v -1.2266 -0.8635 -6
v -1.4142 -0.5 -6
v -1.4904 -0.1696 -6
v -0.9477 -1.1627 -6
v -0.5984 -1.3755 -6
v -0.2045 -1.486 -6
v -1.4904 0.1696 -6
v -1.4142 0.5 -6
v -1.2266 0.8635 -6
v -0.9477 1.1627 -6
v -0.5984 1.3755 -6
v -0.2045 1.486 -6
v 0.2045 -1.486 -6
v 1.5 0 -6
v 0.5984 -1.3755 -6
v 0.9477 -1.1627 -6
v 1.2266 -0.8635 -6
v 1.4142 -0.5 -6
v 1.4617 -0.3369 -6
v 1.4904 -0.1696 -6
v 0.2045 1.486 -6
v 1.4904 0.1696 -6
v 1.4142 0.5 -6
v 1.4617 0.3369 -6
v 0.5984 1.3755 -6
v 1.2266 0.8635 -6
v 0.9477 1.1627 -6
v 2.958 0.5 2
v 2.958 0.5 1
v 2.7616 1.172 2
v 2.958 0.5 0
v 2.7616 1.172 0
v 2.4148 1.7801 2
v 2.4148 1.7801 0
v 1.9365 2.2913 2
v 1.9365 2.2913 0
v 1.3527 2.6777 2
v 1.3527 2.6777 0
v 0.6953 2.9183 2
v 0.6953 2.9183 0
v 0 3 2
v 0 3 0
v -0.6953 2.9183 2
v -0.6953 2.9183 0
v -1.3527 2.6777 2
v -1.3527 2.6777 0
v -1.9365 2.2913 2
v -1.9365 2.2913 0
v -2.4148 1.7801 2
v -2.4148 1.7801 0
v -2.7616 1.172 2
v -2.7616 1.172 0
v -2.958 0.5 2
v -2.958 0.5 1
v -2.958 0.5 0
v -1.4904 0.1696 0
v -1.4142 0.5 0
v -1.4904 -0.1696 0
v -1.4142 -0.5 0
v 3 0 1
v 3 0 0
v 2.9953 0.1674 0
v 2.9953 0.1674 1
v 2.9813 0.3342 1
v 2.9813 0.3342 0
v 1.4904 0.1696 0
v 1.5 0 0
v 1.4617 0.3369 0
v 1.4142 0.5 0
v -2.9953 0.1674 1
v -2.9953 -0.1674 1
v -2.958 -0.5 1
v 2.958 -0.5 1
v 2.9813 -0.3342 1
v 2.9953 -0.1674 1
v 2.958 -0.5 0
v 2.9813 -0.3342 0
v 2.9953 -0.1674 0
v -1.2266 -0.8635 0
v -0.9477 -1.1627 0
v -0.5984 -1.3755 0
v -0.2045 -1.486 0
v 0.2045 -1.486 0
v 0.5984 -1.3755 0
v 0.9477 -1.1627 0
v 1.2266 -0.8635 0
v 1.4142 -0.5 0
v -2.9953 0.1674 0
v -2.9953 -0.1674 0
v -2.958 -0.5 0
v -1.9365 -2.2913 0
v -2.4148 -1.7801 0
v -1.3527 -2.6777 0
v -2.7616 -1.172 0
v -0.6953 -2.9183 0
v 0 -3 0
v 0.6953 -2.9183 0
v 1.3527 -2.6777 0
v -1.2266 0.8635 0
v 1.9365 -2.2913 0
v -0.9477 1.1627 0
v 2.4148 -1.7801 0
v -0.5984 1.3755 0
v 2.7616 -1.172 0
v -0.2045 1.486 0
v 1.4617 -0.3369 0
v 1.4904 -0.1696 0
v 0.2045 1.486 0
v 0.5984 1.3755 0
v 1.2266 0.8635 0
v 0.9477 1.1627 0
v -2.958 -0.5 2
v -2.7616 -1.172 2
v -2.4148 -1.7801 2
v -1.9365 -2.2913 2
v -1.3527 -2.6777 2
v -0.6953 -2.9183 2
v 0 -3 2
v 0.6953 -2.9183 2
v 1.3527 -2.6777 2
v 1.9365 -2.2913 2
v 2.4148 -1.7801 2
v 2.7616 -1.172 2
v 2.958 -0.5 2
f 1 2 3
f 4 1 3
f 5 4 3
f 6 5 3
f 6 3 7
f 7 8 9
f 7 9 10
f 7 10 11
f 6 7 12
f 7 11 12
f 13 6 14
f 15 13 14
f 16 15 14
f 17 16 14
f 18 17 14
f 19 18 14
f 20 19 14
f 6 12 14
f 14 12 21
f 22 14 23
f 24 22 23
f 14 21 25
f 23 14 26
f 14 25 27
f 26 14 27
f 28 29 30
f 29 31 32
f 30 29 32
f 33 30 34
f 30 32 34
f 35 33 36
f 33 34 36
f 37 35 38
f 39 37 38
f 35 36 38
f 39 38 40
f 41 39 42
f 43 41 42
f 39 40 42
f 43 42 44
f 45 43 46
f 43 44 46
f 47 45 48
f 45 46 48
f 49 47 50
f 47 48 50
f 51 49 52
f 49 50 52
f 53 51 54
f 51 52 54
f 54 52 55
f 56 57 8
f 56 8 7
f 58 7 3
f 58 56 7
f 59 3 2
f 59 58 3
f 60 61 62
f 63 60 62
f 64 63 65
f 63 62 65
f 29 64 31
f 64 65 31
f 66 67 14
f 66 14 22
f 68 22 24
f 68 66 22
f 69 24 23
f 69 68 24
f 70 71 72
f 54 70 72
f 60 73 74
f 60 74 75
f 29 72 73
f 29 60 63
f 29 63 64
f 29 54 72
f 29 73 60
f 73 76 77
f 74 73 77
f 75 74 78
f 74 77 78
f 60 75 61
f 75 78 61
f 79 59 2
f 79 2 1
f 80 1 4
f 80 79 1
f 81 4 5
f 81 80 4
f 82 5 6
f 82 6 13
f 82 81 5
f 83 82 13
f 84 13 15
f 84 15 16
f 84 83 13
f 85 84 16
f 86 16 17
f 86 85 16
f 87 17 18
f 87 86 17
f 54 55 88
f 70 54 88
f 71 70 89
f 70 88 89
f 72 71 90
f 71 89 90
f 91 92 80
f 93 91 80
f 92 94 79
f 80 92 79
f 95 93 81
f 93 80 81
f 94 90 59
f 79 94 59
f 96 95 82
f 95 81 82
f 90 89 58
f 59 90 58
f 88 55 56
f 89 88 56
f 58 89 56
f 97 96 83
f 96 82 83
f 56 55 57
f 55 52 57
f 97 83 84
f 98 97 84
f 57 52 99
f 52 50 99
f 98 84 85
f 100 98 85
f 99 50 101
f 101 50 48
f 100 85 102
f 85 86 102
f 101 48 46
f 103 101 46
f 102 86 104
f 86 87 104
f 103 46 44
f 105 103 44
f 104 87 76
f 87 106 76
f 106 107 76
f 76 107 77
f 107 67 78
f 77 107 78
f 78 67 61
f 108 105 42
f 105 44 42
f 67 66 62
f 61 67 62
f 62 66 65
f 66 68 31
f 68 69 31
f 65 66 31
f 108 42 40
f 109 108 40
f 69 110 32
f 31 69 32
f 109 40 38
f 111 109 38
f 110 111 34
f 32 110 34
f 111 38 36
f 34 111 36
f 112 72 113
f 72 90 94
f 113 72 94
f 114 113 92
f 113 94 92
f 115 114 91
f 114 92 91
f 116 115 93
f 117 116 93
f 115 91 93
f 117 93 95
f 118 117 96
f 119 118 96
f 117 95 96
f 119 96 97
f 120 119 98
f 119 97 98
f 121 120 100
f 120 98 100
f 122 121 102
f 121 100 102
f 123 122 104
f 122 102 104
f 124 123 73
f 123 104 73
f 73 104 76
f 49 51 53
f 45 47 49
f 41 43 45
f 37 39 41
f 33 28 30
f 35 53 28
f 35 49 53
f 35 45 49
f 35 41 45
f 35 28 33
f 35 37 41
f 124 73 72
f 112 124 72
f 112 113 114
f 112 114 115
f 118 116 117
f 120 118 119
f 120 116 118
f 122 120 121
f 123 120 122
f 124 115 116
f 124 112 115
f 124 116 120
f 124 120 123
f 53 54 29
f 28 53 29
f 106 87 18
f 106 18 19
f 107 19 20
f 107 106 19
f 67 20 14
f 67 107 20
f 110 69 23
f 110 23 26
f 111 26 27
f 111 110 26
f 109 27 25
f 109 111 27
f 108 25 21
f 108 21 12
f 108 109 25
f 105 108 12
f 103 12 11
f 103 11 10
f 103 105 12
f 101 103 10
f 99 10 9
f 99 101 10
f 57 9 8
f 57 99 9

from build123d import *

# Parameters (mm, degrees)
F1_DEPTH = 6
F2_DEPTH = 2
F3_DEPTH = 1


# Not quite as in the source:
# - a feature names something its author has since deleted; it is built from what else it names


with BuildPart() as f1:
    # F0 (on Top) → F1 (new body)
    with BuildSketch(Plane.XY):
        with BuildLine():
            Line((-1.4142135624, 0.5), (1.4142135624, 0.5))
            ThreePointArc((1.4142135624, 0.5), (0, 1.5), (-1.4142135624, 0.5))
        make_face()
        with BuildLine():
            ThreePointArc((1.5, 0), (1.4783978395, 0.2536529681), (1.4142135624, 0.5))
            Line((1.4142135624, 0.5), (-1.4142135624, 0.5))
            ThreePointArc((-1.4142135624, 0.5), (-1.5, 0), (-1.4142135624, -0.5))
            Line((-1.4142135624, -0.5), (1.4142135624, -0.5))
            ThreePointArc((1.4142135624, -0.5), (1.4783978395, -0.2536529681), (1.5, 0))
        make_face()
        with BuildLine():
            ThreePointArc((-1.4142135624, -0.5), (0, -1.5), (1.4142135624, -0.5))
            Line((1.4142135624, -0.5), (-1.4142135624, -0.5))
        make_face()
    extrude(amount=-F1_DEPTH)

    # F0 (on Top) → F2 (join)
    with BuildSketch(Plane.XY):
        with BuildLine():
            ThreePointArc((-2.9580398915, -0.5), (0, -3), (2.9580398915, -0.5))
            Line((2.9580398915, -0.5), (1.4142135624, -0.5))
            ThreePointArc((1.4142135624, -0.5), (0, -1.5), (-1.4142135624, -0.5))
            Line((-1.4142135624, -0.5), (-2.9580398915, -0.5))
        make_face()
        with BuildLine():
            Line((1.4142135624, 0.5), (2.9580398915, 0.5))
            ThreePointArc((2.9580398915, 0.5), (0, 3), (-2.9580398915, 0.5))
            Line((-2.9580398915, 0.5), (-1.4142135624, 0.5))
            ThreePointArc((-1.4142135624, 0.5), (0, 1.5), (1.4142135624, 0.5))
        make_face()
        with BuildLine():
            Line((-1.4142135624, 0.5), (1.4142135624, 0.5))
            ThreePointArc((1.4142135624, 0.5), (0, 1.5), (-1.4142135624, 0.5))
        make_face()
        with BuildLine():
            ThreePointArc((-1.4142135624, -0.5), (0, -1.5), (1.4142135624, -0.5))
            Line((1.4142135624, -0.5), (-1.4142135624, -0.5))
        make_face()
    extrude(amount=F2_DEPTH)

    # F0 (on Top) → F3 (join)
    with BuildSketch(Plane.XY):
        with BuildLine():
            Line((-1.4142135624, 0.5), (-2.9580398915, 0.5))
            ThreePointArc((-2.9580398915, 0.5), (-3, 0), (-2.9580398915, -0.5))
            Line((-2.9580398915, -0.5), (-1.4142135624, -0.5))
            ThreePointArc((-1.4142135624, -0.5), (-1.5, 0), (-1.4142135624, 0.5))
        make_face()
        with BuildLine():
            ThreePointArc((1.5, 0), (1.4783978395, 0.2536529681), (1.4142135624, 0.5))
            Line((1.4142135624, 0.5), (-1.4142135624, 0.5))
            ThreePointArc((-1.4142135624, 0.5), (-1.5, 0), (-1.4142135624, -0.5))
            Line((-1.4142135624, -0.5), (1.4142135624, -0.5))
            ThreePointArc((1.4142135624, -0.5), (1.4783978395, -0.2536529681), (1.5, 0))
        make_face()
        with BuildLine():
            ThreePointArc((2.9580398915, -0.5), (2.9894915684, -0.2508787808), (3, 0))
            ThreePointArc((3, 0), (2.9894915684, 0.2508787808), (2.9580398915, 0.5))
            Line((2.9580398915, 0.5), (1.4142135624, 0.5))
            ThreePointArc((1.4142135624, 0.5), (1.4783978395, 0.2536529681), (1.5, 0))
            ThreePointArc((1.5, 0), (1.4783978395, -0.2536529681), (1.4142135624, -0.5))
            Line((1.4142135624, -0.5), (2.9580398915, -0.5))
        make_face()
    extrude(amount=F3_DEPTH)


solid = f1.part
